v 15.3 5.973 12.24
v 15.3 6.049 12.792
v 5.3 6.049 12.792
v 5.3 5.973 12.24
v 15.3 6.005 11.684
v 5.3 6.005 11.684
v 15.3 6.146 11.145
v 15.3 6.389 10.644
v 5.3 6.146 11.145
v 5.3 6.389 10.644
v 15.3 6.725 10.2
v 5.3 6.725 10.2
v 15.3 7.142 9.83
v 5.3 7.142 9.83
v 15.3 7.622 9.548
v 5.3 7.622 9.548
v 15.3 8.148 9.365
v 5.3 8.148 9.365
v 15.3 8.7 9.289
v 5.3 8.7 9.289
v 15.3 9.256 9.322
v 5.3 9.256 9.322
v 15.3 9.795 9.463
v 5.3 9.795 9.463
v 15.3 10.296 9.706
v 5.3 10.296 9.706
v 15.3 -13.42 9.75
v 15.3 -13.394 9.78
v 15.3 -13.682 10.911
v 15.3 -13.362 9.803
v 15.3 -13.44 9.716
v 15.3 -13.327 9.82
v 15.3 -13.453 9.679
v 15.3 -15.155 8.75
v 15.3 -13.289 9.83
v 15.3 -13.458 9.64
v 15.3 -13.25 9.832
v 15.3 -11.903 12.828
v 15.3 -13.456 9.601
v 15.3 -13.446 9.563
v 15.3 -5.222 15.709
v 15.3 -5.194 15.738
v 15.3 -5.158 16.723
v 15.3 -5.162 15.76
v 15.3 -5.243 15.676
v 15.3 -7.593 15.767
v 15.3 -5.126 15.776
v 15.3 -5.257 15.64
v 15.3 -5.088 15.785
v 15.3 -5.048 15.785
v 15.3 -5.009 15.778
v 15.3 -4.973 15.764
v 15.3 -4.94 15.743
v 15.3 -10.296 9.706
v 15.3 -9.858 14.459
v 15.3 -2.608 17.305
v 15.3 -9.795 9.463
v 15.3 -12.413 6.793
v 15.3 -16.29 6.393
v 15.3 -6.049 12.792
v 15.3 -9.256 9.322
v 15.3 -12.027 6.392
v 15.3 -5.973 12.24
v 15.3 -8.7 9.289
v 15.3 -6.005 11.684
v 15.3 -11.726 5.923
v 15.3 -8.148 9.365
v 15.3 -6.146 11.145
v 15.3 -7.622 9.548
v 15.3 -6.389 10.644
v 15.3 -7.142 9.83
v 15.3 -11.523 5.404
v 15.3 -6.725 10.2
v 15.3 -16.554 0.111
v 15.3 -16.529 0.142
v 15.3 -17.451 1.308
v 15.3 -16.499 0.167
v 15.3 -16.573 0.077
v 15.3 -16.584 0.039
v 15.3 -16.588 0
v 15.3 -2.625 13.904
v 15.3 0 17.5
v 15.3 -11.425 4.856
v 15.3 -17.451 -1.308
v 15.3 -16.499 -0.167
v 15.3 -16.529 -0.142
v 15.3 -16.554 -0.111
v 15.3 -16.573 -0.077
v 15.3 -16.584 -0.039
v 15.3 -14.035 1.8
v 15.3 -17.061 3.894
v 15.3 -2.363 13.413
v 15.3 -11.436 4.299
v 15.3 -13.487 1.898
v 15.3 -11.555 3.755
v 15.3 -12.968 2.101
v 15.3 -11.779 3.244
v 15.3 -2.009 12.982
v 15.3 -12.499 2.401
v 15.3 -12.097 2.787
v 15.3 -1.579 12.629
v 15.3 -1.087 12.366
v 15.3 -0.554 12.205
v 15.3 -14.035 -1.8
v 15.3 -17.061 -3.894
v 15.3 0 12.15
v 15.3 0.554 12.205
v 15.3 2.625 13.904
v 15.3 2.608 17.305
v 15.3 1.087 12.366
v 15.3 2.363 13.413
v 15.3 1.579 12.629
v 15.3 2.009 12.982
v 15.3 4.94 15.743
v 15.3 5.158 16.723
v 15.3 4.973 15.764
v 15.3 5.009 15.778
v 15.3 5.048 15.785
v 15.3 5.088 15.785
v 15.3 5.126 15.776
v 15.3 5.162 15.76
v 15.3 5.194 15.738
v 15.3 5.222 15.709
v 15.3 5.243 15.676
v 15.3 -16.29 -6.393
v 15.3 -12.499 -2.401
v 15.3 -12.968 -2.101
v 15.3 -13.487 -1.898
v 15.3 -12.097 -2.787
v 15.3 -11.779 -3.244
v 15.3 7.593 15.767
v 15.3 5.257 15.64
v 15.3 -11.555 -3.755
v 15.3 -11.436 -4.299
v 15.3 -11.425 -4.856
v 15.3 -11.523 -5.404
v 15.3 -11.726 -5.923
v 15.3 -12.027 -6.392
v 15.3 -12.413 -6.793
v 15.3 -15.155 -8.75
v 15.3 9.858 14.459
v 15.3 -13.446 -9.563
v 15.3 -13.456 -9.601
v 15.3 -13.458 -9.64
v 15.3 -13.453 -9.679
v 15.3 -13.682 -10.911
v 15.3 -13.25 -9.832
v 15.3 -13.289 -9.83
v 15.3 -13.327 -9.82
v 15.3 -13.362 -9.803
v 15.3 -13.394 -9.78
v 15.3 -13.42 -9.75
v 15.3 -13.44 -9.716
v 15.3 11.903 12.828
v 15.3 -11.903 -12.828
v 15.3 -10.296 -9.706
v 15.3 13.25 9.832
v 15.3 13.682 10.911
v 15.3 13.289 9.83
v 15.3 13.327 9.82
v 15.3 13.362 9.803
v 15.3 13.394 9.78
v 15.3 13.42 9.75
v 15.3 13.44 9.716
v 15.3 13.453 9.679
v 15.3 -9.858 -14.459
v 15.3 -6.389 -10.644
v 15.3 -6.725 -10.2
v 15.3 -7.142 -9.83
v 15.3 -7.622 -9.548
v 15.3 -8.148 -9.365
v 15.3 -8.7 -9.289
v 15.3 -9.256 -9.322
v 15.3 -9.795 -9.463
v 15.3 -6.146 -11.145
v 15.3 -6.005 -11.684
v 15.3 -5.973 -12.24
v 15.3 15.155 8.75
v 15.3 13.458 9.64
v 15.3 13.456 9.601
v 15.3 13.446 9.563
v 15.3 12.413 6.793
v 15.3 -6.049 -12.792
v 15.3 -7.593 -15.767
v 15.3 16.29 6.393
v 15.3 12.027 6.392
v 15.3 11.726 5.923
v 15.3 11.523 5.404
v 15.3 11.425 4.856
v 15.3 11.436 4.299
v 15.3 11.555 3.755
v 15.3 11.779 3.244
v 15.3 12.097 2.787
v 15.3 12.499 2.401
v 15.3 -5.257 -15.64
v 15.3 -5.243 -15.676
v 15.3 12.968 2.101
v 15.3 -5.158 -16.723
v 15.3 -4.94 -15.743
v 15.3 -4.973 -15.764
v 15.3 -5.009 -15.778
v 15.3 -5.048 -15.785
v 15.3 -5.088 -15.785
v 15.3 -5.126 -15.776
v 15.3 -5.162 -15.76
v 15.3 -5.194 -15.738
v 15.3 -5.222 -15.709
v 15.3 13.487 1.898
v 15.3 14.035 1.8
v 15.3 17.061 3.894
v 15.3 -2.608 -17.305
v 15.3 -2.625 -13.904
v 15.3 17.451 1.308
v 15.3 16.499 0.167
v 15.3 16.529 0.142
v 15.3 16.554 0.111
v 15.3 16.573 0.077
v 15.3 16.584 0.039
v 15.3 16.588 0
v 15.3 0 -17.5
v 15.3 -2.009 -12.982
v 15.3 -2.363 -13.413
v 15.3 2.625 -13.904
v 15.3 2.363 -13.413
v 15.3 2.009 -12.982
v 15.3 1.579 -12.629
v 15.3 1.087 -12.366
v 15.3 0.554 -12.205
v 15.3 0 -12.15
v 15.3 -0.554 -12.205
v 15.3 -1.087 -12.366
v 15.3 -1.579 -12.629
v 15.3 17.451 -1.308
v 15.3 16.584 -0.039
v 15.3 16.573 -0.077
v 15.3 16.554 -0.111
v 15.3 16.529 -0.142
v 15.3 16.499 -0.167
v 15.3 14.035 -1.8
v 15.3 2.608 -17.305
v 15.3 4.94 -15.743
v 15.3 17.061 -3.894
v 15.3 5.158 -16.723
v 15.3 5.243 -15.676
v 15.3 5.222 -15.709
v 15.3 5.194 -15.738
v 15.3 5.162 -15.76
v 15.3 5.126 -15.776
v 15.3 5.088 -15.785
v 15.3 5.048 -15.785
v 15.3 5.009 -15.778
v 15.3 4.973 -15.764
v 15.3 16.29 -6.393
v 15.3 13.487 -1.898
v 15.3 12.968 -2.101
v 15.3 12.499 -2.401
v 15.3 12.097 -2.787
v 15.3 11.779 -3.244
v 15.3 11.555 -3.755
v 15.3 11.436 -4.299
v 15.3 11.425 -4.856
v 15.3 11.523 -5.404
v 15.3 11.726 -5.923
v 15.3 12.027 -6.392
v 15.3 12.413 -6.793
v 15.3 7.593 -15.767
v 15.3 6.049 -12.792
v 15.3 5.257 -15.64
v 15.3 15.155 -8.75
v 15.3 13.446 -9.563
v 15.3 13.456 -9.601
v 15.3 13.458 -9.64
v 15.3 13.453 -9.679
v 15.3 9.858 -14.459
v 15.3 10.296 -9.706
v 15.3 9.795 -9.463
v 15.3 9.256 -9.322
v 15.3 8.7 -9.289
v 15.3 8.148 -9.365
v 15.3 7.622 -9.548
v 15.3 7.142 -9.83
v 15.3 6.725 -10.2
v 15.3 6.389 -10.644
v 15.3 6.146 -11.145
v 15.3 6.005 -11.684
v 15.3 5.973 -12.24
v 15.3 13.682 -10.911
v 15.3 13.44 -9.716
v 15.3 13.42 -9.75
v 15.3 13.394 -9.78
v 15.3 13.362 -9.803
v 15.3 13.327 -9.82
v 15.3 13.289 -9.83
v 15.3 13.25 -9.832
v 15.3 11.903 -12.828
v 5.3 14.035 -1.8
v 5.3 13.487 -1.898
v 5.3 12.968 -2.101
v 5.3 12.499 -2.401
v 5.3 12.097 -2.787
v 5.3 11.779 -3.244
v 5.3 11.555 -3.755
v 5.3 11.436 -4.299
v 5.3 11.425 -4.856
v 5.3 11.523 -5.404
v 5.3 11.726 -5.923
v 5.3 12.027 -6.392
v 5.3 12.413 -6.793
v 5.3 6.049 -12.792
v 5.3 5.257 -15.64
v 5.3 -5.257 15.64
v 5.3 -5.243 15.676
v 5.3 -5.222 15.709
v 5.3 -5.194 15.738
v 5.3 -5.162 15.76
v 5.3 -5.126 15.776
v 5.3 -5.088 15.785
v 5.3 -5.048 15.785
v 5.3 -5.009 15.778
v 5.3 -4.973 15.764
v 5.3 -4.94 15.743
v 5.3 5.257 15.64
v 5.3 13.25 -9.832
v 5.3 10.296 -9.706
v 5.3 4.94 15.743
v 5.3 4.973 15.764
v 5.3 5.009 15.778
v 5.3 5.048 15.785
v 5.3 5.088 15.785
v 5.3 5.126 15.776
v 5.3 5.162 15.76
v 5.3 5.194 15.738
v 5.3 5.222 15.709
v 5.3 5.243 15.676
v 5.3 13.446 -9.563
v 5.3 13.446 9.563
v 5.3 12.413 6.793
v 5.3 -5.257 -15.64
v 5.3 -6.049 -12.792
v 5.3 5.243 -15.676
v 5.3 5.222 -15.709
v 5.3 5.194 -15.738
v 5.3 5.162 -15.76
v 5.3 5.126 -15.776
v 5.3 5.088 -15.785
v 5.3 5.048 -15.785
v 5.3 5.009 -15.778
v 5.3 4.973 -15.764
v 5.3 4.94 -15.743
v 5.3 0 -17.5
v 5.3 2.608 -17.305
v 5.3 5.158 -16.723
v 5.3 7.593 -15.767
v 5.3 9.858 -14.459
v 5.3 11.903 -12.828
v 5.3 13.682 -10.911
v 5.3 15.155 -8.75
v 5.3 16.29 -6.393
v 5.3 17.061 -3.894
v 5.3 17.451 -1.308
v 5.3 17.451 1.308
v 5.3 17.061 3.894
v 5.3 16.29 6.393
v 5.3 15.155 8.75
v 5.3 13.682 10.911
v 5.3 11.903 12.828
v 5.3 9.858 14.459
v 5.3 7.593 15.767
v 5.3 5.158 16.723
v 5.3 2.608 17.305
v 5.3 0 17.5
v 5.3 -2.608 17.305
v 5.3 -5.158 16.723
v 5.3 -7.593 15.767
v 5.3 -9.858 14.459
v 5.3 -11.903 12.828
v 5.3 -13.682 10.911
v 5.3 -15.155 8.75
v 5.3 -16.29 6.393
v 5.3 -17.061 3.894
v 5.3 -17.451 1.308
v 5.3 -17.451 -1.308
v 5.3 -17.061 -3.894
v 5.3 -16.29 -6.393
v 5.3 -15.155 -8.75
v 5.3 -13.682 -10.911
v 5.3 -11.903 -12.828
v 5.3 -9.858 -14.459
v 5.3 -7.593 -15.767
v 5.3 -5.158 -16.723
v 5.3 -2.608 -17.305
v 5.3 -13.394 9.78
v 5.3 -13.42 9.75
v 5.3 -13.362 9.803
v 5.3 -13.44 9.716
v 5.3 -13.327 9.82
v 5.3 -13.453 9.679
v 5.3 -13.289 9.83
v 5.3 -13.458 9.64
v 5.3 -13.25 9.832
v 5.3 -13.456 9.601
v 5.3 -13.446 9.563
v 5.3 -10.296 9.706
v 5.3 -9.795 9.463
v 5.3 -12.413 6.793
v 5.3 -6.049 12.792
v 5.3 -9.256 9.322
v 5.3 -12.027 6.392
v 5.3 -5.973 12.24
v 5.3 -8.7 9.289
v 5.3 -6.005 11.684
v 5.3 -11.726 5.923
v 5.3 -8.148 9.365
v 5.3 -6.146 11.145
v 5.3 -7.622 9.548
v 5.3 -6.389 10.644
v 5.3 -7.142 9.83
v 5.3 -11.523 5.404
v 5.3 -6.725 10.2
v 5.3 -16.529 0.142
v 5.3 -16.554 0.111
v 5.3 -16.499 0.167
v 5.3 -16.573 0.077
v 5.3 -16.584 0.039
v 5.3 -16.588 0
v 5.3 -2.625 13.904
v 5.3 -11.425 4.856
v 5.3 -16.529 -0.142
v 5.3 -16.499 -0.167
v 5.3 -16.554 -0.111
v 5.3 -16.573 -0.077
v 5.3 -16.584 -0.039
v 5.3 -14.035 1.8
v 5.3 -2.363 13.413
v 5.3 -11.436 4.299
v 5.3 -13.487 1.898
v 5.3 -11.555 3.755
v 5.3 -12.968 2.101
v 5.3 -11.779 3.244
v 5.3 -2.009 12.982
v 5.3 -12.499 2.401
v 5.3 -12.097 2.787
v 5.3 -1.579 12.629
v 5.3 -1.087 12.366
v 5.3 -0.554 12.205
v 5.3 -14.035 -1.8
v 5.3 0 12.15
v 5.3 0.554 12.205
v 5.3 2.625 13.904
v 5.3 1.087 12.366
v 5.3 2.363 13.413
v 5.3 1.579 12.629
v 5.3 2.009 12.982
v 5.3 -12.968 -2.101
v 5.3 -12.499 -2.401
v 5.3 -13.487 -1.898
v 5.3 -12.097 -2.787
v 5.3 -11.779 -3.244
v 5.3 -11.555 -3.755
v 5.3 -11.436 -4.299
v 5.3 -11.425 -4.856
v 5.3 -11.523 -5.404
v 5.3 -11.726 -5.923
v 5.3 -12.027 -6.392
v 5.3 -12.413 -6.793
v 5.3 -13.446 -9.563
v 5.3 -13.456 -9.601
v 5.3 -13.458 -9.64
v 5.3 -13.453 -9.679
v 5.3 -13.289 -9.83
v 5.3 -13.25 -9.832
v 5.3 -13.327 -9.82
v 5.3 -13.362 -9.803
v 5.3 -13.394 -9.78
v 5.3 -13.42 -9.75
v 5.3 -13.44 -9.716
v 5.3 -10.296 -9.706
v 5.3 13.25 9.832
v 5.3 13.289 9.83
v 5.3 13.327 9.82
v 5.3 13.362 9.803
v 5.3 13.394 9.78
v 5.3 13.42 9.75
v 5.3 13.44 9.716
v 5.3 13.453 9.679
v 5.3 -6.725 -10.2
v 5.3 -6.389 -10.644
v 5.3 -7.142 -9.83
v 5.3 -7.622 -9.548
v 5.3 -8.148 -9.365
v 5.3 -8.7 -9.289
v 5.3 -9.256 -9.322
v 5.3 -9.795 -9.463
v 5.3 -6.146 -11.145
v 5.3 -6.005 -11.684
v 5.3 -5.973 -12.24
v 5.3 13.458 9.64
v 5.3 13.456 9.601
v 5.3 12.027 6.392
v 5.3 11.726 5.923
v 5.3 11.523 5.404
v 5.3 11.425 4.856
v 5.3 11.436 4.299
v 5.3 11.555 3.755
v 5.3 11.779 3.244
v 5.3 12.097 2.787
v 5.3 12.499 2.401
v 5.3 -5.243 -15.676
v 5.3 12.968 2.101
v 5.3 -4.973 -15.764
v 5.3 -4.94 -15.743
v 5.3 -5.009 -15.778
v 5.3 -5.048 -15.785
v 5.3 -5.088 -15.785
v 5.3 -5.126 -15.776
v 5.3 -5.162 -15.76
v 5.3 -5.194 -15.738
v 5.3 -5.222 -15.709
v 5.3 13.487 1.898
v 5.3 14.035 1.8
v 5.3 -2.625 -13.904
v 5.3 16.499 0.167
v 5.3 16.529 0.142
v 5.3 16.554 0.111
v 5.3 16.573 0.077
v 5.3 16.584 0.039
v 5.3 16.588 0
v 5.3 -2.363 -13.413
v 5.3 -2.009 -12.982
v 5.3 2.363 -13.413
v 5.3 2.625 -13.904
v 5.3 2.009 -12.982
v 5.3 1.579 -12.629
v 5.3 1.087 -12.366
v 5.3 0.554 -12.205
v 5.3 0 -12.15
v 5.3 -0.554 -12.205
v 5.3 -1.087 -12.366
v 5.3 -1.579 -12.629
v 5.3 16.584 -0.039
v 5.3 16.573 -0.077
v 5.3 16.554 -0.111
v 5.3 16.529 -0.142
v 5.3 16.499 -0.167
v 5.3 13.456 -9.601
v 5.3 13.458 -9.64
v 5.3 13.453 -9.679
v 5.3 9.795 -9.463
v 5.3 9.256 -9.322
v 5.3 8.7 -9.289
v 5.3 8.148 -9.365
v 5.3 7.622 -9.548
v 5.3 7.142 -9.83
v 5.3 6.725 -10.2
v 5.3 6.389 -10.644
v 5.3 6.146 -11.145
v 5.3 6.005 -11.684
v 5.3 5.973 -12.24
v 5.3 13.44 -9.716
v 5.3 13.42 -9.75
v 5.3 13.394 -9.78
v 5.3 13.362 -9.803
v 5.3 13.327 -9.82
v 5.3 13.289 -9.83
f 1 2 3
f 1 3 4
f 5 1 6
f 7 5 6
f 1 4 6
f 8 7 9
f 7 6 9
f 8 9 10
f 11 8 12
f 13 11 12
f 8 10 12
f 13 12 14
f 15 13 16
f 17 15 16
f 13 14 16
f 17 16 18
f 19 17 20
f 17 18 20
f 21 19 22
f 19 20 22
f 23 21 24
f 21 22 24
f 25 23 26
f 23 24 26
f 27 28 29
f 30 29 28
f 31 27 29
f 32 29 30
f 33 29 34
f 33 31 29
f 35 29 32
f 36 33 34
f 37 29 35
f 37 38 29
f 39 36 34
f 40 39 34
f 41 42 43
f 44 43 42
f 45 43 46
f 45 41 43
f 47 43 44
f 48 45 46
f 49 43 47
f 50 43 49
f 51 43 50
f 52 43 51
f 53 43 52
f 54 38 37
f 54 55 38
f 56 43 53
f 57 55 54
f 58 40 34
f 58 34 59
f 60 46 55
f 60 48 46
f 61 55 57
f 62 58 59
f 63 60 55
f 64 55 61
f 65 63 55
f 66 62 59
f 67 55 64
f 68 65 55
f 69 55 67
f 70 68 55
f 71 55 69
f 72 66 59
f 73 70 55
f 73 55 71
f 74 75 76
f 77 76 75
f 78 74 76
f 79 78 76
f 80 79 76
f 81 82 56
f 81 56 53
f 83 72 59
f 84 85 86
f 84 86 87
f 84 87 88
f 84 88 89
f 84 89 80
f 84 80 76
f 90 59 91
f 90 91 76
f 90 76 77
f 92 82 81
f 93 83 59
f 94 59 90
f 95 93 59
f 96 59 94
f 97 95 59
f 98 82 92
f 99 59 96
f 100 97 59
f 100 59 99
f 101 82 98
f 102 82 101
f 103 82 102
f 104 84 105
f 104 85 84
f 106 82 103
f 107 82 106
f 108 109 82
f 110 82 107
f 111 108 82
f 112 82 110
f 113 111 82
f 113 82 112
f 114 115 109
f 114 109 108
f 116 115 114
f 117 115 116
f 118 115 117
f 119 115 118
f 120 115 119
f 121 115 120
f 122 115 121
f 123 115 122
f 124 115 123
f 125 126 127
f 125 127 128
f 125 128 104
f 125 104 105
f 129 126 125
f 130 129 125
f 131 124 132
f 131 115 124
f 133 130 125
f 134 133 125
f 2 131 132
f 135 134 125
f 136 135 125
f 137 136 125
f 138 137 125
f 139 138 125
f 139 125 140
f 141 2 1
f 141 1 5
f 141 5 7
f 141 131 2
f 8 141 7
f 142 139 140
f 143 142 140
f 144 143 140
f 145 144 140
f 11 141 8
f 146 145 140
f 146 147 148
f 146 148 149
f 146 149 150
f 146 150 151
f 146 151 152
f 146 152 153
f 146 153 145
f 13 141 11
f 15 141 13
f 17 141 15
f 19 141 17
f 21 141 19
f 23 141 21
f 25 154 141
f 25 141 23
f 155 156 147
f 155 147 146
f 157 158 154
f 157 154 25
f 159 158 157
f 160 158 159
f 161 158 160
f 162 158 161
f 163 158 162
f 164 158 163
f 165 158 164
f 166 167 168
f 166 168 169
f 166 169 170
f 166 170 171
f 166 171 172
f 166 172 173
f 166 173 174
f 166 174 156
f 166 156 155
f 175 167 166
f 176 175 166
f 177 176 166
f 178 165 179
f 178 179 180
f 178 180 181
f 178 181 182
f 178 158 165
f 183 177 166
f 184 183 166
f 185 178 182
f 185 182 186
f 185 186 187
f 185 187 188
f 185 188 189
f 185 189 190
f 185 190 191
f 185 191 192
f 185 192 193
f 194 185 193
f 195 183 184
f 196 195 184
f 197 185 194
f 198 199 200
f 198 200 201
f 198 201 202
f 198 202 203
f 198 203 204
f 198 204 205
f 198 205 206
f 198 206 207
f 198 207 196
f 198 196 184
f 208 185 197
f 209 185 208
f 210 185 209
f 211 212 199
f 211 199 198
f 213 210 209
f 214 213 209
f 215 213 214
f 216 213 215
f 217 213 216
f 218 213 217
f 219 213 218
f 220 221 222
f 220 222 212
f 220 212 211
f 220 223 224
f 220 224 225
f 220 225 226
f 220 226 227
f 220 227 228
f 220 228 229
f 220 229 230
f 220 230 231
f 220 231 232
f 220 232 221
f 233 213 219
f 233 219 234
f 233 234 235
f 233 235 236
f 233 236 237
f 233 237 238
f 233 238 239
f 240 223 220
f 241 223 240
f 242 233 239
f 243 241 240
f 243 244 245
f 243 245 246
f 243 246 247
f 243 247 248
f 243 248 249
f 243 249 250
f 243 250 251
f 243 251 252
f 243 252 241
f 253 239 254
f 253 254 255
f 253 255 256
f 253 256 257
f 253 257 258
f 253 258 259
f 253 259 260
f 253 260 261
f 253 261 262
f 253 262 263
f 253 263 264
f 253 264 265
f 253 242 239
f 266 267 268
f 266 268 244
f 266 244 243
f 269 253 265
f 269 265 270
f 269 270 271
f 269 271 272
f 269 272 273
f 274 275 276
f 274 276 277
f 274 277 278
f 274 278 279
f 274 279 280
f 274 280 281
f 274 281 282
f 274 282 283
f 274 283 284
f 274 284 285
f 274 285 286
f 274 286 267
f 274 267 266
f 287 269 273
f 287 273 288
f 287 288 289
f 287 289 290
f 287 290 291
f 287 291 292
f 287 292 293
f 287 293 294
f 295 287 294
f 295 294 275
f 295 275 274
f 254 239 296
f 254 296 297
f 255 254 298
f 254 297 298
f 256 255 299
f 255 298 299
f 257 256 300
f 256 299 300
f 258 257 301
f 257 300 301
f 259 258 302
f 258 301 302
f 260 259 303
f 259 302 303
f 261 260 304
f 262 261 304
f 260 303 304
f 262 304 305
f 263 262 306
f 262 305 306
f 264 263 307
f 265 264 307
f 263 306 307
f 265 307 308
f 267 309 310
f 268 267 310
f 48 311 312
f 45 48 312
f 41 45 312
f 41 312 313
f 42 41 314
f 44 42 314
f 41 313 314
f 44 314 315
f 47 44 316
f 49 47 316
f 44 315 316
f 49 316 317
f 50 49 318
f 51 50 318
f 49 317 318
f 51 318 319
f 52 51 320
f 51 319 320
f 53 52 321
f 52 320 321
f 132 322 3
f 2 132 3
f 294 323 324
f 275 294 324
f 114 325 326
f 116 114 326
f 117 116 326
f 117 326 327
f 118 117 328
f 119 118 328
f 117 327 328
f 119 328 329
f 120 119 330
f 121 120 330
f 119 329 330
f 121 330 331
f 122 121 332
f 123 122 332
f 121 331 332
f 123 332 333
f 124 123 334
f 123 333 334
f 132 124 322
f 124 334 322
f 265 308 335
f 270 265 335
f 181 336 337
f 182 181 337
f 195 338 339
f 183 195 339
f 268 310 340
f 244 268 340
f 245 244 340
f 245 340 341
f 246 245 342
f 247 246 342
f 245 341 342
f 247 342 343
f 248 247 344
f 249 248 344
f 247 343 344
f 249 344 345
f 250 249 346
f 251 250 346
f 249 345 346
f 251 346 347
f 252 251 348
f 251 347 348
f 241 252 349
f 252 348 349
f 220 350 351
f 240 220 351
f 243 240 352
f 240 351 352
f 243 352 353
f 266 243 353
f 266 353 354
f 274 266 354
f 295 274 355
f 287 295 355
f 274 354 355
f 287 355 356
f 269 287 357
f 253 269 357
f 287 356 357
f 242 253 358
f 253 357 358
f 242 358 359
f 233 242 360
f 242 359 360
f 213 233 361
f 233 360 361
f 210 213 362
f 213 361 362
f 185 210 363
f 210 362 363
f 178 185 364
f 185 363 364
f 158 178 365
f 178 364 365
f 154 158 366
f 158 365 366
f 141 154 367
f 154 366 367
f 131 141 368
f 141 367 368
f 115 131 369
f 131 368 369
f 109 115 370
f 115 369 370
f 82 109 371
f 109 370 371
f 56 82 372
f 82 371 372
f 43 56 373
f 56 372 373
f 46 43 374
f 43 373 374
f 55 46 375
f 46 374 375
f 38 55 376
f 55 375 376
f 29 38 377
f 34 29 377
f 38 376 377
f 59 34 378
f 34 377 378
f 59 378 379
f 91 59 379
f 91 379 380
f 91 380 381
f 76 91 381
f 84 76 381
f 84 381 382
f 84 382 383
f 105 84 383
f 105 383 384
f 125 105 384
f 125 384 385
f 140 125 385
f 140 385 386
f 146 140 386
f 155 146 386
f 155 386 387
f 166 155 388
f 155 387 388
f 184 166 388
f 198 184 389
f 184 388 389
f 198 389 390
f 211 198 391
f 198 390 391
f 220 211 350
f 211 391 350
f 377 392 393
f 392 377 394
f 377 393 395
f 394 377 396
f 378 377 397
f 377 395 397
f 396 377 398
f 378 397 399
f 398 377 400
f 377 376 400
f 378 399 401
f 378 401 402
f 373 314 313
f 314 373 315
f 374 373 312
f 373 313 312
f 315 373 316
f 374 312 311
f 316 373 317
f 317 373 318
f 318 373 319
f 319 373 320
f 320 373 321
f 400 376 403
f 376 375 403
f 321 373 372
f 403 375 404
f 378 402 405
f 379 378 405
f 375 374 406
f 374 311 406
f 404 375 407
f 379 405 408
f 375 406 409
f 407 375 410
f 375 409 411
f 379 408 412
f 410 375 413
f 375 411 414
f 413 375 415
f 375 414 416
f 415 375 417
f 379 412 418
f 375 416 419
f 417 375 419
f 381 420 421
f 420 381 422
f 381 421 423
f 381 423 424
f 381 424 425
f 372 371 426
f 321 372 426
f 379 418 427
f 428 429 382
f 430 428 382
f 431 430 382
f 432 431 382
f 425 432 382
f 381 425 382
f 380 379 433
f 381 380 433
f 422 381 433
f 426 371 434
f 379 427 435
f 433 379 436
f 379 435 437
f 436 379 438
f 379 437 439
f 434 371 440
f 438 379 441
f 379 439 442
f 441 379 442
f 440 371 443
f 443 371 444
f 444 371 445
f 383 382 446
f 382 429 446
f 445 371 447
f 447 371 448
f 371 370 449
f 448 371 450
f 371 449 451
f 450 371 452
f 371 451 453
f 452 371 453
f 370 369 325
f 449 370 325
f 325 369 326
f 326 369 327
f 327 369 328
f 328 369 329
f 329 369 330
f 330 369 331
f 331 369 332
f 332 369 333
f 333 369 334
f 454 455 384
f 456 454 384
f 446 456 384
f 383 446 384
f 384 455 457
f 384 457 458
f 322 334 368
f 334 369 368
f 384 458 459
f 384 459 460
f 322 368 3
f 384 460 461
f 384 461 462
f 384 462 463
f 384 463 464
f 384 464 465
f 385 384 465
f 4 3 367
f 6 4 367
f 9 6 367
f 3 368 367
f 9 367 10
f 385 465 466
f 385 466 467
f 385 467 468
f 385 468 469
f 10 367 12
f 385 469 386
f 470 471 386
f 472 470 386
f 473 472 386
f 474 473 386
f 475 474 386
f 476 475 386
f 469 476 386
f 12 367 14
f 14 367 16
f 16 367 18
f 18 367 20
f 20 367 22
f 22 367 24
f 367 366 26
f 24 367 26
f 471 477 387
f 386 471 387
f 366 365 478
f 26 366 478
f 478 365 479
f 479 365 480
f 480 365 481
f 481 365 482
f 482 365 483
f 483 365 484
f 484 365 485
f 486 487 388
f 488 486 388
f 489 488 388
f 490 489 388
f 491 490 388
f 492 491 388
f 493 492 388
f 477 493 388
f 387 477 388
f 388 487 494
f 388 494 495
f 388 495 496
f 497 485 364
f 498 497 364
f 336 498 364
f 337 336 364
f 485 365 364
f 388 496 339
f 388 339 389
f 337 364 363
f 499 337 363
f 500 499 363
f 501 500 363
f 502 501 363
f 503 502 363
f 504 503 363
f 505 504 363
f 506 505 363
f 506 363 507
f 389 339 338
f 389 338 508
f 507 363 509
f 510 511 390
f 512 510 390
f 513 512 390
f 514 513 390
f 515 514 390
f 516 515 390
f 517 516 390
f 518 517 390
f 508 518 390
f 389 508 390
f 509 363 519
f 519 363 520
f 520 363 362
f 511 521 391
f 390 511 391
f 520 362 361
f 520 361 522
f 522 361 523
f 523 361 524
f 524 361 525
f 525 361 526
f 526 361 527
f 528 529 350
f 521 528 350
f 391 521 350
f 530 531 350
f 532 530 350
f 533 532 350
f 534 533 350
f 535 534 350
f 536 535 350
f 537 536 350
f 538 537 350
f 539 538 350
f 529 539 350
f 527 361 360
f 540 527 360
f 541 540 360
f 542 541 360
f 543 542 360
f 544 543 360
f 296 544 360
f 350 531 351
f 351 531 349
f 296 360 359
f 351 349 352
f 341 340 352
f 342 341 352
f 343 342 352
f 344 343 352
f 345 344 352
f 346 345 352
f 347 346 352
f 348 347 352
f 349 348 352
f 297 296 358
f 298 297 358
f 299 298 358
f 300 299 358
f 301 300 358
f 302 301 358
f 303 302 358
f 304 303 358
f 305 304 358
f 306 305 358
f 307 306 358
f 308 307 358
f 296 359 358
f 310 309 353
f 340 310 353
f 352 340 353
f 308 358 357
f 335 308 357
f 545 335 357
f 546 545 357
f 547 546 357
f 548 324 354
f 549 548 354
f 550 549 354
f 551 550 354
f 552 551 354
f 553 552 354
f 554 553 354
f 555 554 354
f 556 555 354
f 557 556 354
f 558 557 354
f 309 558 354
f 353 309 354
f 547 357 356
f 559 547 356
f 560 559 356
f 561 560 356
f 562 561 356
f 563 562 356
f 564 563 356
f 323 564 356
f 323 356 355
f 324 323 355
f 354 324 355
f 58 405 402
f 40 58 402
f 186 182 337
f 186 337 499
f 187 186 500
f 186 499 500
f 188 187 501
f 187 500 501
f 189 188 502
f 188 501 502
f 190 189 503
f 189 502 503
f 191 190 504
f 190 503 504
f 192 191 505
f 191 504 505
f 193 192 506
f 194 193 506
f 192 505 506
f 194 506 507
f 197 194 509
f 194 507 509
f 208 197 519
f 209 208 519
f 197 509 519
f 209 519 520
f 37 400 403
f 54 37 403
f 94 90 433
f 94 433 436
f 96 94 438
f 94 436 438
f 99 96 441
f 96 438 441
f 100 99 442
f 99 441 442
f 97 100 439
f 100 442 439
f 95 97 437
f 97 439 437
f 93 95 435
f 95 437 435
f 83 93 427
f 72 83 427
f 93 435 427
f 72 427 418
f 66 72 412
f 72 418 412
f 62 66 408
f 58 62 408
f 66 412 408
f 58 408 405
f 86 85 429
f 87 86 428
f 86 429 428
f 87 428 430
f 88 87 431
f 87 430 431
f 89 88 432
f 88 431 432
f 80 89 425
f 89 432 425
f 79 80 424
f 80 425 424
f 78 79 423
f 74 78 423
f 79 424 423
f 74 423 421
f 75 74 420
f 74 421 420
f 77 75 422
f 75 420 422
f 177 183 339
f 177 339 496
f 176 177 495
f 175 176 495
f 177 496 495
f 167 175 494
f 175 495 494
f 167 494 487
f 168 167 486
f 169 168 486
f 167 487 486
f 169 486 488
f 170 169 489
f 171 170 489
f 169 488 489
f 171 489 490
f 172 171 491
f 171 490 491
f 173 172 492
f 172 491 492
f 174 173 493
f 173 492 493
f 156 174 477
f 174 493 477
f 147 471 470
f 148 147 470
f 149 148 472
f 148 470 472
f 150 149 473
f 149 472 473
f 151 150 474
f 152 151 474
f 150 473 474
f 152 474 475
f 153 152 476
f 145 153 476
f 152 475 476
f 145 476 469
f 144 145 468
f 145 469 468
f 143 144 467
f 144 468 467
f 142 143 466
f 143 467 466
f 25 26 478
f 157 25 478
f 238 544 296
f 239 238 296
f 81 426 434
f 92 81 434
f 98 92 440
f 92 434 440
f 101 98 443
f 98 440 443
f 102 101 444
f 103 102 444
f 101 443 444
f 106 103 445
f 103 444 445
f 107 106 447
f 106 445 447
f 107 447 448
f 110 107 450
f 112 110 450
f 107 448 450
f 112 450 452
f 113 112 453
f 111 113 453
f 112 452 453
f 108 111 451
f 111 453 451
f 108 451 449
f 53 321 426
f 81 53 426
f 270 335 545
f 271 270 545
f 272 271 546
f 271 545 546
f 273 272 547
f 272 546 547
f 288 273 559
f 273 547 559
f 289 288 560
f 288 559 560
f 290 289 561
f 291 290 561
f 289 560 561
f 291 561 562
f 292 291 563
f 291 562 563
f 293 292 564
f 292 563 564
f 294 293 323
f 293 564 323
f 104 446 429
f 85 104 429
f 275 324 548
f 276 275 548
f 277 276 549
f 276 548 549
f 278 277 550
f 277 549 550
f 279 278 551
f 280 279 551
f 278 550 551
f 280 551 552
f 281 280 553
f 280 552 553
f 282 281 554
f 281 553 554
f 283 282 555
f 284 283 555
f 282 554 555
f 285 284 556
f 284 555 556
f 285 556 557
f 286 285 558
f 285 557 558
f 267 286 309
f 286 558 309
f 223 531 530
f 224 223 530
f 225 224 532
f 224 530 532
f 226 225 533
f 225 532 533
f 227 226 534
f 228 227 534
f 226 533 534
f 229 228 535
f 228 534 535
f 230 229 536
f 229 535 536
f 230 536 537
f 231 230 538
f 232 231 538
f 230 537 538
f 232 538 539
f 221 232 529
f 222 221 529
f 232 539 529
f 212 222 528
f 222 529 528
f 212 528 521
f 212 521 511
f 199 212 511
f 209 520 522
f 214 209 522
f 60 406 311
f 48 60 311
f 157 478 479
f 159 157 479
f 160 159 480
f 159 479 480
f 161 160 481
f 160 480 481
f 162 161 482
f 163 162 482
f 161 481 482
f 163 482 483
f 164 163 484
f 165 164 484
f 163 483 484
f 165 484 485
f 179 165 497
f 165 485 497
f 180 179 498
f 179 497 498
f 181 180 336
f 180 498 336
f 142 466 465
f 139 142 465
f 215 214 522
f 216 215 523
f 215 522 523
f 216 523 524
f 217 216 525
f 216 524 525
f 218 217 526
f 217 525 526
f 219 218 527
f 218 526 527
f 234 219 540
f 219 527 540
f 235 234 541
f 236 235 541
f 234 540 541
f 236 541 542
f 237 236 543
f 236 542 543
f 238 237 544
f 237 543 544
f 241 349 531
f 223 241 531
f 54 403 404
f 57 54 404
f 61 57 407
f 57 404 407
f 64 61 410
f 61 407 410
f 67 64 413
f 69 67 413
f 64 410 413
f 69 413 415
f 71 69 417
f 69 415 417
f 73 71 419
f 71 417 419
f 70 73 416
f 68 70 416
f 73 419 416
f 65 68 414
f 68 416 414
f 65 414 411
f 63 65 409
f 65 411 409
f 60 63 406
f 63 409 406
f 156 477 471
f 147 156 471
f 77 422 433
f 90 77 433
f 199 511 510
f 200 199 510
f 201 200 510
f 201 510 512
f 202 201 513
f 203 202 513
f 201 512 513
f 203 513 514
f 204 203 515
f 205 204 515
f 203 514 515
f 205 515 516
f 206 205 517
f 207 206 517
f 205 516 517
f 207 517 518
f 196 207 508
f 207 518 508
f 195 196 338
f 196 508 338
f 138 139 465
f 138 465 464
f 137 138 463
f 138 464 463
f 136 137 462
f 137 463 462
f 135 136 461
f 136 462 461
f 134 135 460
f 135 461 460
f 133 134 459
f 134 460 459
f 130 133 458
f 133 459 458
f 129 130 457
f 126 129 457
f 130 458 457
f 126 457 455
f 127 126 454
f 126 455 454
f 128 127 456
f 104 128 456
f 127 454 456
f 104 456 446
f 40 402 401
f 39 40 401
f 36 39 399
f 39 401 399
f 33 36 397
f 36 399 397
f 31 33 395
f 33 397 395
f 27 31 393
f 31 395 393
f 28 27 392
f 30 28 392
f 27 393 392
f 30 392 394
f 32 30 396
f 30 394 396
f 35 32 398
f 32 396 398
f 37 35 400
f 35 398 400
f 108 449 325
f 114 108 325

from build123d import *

# Parameters (mm, degrees)
BOSS_EXTRUDE1_DEPTH     = 5.3
CIRPATTERN1_COUNT       = 10
FILLET1_R               = 0.2
FILLET3_R               = 0.2
SKETCH2_R               = 10
SKETCH2_R_2             = 4.05
BOSS_EXTRUDE2_DEPTH     = 16.7
CUT_EXTRUDE1_DEPTH      = 29.341701561
CUT_EXTRUDE1_DEPTH_BACK = 29.341701561
SKETCH2_2_R             = 4.05
SKETCH3_R               = 17.5
BOSS_EXTRUDE3_DEPTH     = 10
SKETCH3_3_R             = 17.5
CUT_EXTRUDE2_DEPTH      = 34.11344138


with BuildPart() as part:
    # Sketch1 → Boss-Extrude1 (new body)
    with BuildSketch(Plane(origin=(0, 0, 0), x_dir=(0, 0, -1), z_dir=(1, 0, 0))):
        with BuildLine():
            Line((0, 0), (9.845402976, 13.551034656))
            Line((9.845402976, 13.551034656), (6.793214092, 12.412684734))
            ThreePointArc((6.793214092, 12.412684734), (3.754556482, 11.555336673), (1.800167381, 14.035023954))
            Line((1.800167381, 14.035023954), (0, 16.75))
            Line((0, 16.75), (0, 0))
        make_face()
    boss_extrude1 = extrude(amount=BOSS_EXTRUDE1_DEPTH)

    # CirPattern1: Boss-Extrude1 ×10 about axis
    cirpattern1_axis = Axis((5.3, 0, 0), (-1, 0, 0))
    for i in range(1, CIRPATTERN1_COUNT):
        add(boss_extrude1.rotate(cirpattern1_axis, i * 360 / CIRPATTERN1_COUNT))

    # Fillet1
    fillet1_edges = [part.edges().sort_by_distance(p)[0] for p in [
        (2.65, 16.75, 0),
    ]]
    fillet(fillet1_edges, radius=FILLET1_R)

    # Fillet3
    fillet3_edges = [part.edges().sort_by_distance(p)[0] for p in [
        (2.65, 13.551034656, 9.845402976),
        (2.65, 5.176034656, 15.930196648),
        (2.65, -5.176034656, 15.930196648),
        (2.65, -13.551034656, 9.845402976),
        (2.65, -16.75, 0),
        (2.65, -13.551034656, -9.845402976),
        (2.65, -5.176034656, -15.930196648),
        (2.65, 5.176034656, -15.930196648),
        (2.65, 13.551034656, -9.845402976),
    ]]
    fillet(fillet3_edges, radius=FILLET3_R)

    # Sketch2 → Boss-Extrude2 (add)
    with BuildSketch(Plane.ZY):
        Circle(SKETCH2_R)
        Circle(SKETCH2_R_2, mode=Mode.SUBTRACT)
    extrude(amount=BOSS_EXTRUDE2_DEPTH)

    # Sketch2<2> → Cut-Extrude1 (cut, two sides: drawn at the far end of the back side and taken through both)
    with BuildSketch(Plane.ZY.offset(-CUT_EXTRUDE1_DEPTH_BACK)):
        Circle(SKETCH2_2_R)
    extrude(amount=CUT_EXTRUDE1_DEPTH + CUT_EXTRUDE1_DEPTH_BACK, mode=Mode.SUBTRACT)

    # Sketch3<3> → Cut-Extrude2 (cut, through all)
    with BuildSketch(Plane(origin=(5.3, 0, 0), x_dir=(0, 0, -1), z_dir=(1, 0, 0))):
        Circle(SKETCH3_3_R)
    extrude(amount=-CUT_EXTRUDE2_DEPTH, mode=Mode.SUBTRACT)


with BuildPart() as body_2:
    # Sketch3 → Boss-Extrude3 (new body)
    with BuildSketch(Plane(origin=(5.3, 0, 0), x_dir=(0, 0, -1), z_dir=(1, 0, 0))):
        Circle(SKETCH3_R)
        with BuildLine():
            Line((-9.562783501, 13.445628382), (-6.793214092, 12.412684734))
            ThreePointArc((-6.793214092, 12.412684734), (-3.754556482, 11.555336673), (-1.800167381, 14.035023954))
            Line((-1.800167381, 14.035023954), (-0.166687705, 16.498604974))
            ThreePointArc((-0.166687705, 16.498604974), (0, 16.588082537), (0.166687705, 16.498604974))
            Line((0.166687705, 16.498604974), (1.800167381, 14.035023954))
            ThreePointArc((1.800167381, 14.035023954), (3.754556482, 11.555336673), (6.793214092, 12.412684734))
            Line((6.793214092, 12.412684734), (9.562783501, 13.445628382))
            ThreePointArc((9.562783501, 13.445628382), (9.750230279, 13.420040677), (9.832489873, 13.249675233))
            Line((9.832489873, 13.249675233), (9.7059461, 10.296461057))
            ThreePointArc((9.7059461, 10.296461057), (9.829556482, 7.141590815), (12.791818675, 6.049121837))
            Line((12.791818675, 6.049121837), (15.639596437, 5.256878748))
            ThreePointArc((15.639596437, 5.256878748), (15.77620399, 5.125999408), (15.742615104, 4.939819893))
            Line((15.742615104, 4.939819893), (13.904383302, 2.625))
            ThreePointArc((13.904383302, 2.625), (12.15, 0), (13.904383302, -2.625))
            Line((13.904383302, -2.625), (15.742615104, -4.939819893))
            ThreePointArc((15.742615104, -4.939819893), (15.77620399, -5.125999408), (15.639596437, -5.256878748))
            Line((15.639596437, -5.256878748), (12.791818675, -6.049121837))
            ThreePointArc((12.791818675, -6.049121837), (9.829556482, -7.141590815), (9.7059461, -10.296461057))
            Line((9.7059461, -10.296461057), (9.832489873, -13.249675233))
            ThreePointArc((9.832489873, -13.249675233), (9.750230279, -13.420040677), (9.562783501, -13.445628382))
            Line((9.562783501, -13.445628382), (6.793214092, -12.412684734))
            ThreePointArc((6.793214092, -12.412684734), (3.754556482, -11.555336673), (1.800167381, -14.035023954))
            Line((1.800167381, -14.035023954), (0.166687705, -16.498604974))
            ThreePointArc((0.166687705, -16.498604974), (0, -16.588082537), (-0.166687705, -16.498604974))
            Line((-0.166687705, -16.498604974), (-1.800167381, -14.035023954))
            ThreePointArc((-1.800167381, -14.035023954), (-3.754556482, -11.555336673), (-6.793214092, -12.412684734))
            Line((-6.793214092, -12.412684734), (-9.562783501, -13.445628382))
            ThreePointArc((-9.562783501, -13.445628382), (-9.750230279, -13.420040677), (-9.832489873, -13.249675233))
            Line((-9.832489873, -13.249675233), (-9.7059461, -10.296461057))
            ThreePointArc((-9.7059461, -10.296461057), (-9.829556482, -7.141590815), (-12.791818675, -6.049121837))
            Line((-12.791818675, -6.049121837), (-15.639596437, -5.256878748))
            ThreePointArc((-15.639596437, -5.256878748), (-15.77620399, -5.125999408), (-15.742615104, -4.939819893))
            Line((-15.742615104, -4.939819893), (-13.904383302, -2.625))
            ThreePointArc((-13.904383302, -2.625), (-12.15, 0), (-13.904383302, 2.625))
            Line((-13.904383302, 2.625), (-15.742615104, 4.939819893))
            ThreePointArc((-15.742615104, 4.939819893), (-15.77620399, 5.125999408), (-15.639596437, 5.256878748))
            Line((-15.639596437, 5.256878748), (-12.791818675, 6.049121837))
            ThreePointArc((-12.791818675, 6.049121837), (-9.829556482, 7.141590815), (-9.7059461, 10.296461057))
            Line((-9.7059461, 10.296461057), (-9.832489873, 13.249675233))
            ThreePointArc((-9.832489873, 13.249675233), (-9.750230279, 13.420040677), (-9.562783501, 13.445628382))
        make_face(mode=Mode.SUBTRACT)
    extrude(amount=BOSS_EXTRUDE3_DEPTH)


solid = body_2.part
